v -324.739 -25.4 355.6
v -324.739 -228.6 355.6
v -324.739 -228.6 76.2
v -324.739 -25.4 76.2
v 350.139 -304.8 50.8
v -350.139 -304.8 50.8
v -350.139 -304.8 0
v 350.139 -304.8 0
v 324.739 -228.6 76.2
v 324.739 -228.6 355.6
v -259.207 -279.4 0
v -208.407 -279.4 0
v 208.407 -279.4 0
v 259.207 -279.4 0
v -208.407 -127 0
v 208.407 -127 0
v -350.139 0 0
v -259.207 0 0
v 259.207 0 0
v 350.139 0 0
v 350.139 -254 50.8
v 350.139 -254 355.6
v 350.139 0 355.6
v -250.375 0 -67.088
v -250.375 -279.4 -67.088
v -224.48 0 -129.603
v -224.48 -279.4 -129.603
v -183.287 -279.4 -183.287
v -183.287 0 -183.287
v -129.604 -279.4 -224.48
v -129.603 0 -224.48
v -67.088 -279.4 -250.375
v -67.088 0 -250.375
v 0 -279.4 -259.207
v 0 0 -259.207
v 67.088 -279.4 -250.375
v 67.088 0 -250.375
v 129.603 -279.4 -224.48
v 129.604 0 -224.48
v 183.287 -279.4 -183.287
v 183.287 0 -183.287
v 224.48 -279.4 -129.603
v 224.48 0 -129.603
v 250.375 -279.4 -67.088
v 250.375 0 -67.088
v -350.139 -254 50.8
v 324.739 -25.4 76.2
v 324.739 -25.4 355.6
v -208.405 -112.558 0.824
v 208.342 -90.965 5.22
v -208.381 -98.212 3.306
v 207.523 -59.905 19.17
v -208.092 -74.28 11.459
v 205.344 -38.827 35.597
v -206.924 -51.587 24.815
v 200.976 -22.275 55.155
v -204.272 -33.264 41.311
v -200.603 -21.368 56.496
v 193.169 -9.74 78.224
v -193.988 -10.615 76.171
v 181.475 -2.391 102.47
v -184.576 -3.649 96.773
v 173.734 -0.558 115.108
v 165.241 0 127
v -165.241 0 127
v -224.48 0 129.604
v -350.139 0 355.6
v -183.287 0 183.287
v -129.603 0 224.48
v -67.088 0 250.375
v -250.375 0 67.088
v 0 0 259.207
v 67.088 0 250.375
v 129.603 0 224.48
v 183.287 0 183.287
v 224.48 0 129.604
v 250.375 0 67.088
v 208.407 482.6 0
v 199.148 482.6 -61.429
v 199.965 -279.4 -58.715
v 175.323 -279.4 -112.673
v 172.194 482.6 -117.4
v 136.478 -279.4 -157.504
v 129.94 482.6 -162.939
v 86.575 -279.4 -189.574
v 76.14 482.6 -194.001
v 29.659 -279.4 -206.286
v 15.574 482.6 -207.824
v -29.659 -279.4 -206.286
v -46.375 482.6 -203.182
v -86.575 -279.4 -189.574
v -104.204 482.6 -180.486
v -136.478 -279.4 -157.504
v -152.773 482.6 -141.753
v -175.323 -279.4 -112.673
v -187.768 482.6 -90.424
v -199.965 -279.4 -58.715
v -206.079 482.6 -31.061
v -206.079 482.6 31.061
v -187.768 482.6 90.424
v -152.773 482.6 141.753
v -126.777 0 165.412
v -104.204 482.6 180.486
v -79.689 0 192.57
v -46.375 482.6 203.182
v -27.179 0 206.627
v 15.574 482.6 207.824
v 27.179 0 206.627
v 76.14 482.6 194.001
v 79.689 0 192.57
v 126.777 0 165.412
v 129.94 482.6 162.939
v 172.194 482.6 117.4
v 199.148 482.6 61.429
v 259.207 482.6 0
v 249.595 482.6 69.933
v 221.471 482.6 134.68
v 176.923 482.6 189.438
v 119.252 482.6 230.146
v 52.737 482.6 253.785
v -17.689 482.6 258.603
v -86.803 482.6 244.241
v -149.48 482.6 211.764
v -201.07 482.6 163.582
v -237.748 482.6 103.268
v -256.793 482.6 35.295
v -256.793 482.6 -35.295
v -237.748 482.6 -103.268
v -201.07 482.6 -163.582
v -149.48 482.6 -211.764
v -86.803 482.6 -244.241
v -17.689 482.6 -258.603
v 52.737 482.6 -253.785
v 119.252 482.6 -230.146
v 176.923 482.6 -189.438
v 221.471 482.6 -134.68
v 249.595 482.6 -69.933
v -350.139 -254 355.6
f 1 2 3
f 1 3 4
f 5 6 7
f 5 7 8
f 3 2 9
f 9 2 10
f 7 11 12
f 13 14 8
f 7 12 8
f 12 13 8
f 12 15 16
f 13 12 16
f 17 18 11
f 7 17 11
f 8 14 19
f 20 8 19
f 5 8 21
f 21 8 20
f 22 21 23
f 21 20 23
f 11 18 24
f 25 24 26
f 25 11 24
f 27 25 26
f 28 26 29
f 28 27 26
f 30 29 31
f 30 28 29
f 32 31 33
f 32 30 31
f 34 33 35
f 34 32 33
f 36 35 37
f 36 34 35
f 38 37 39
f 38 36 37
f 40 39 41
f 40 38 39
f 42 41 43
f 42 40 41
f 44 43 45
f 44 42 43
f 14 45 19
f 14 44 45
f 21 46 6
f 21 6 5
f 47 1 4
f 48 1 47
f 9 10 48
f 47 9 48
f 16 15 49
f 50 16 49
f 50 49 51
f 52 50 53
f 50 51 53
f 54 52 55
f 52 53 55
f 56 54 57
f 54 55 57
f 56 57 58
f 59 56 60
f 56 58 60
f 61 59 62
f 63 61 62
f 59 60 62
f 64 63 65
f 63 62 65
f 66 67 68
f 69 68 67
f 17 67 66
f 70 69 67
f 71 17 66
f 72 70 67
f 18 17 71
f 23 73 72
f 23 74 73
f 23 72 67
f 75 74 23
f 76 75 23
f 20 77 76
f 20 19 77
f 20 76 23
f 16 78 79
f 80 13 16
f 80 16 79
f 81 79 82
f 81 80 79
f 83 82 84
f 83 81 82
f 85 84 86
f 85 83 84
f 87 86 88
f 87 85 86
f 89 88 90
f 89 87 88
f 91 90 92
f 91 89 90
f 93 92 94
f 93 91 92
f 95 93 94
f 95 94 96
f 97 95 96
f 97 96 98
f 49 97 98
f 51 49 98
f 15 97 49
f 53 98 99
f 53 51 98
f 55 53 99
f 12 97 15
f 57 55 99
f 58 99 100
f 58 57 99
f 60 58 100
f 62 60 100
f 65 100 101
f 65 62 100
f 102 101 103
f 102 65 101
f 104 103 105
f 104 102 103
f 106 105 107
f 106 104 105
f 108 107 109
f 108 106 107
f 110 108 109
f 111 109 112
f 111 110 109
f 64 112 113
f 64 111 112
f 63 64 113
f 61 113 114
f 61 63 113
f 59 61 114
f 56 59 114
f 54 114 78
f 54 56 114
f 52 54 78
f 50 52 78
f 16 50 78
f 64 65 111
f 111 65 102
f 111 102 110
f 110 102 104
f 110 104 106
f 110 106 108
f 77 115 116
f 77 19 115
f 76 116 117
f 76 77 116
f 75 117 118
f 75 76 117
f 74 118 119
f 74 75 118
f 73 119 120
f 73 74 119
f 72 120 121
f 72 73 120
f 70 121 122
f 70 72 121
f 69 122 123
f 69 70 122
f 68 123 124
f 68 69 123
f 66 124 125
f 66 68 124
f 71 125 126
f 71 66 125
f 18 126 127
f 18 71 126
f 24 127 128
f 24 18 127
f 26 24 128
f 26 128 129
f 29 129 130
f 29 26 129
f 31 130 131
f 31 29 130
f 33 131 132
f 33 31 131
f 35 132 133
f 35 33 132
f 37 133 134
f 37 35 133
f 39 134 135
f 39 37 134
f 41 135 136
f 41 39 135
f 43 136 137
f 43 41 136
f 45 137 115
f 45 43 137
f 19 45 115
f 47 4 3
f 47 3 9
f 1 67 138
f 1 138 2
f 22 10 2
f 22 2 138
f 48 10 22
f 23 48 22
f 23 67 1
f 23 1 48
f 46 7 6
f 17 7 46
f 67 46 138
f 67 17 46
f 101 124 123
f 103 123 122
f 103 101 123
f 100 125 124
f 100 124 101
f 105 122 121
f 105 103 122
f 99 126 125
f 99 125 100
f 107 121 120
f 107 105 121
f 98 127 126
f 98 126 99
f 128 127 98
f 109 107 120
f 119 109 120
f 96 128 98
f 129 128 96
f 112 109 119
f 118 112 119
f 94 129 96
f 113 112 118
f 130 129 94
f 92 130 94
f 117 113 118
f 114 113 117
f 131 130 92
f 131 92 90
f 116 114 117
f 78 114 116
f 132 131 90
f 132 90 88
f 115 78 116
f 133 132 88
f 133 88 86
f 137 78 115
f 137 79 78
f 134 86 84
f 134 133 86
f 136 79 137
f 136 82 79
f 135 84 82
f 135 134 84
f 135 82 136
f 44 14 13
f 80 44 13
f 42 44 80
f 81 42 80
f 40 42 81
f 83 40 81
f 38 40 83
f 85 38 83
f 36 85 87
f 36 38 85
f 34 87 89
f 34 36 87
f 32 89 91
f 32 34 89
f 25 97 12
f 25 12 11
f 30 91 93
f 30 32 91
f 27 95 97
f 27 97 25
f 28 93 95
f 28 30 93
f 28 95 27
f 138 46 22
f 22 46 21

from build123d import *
from build123d.topology import SkipClean

# Parameters (mm, degrees)
SKETCH_2_R          = 259.207
SKETCH_2_R_2        = 208.407
F_19MM_DEPTH        = 482.6
F_11MM_START        = -279.4
F_11MM_DEPTH        = 279.4
SKETCH_8_W          = 700.278
SKETCH_8_H          = 254
EXTRUDE_2_DEPTH     = 355.6
SKETCH_11_W         = 649.478
SKETCH_11_H         = 203.2
CUT_EXTRUDE_1_DEPTH = 279.4
FILLET_2_R          = 127
SKETCH_13_W         = 700.278
SKETCH_13_H         = 50.8
F_2MM_DEPTH         = 50.8


with BuildPart() as part:
    # 草圖2 → 主件固定 19mm (new body)
    with BuildSketch(Plane(origin=(0, 0, 0), x_dir=(1, 0, 0), z_dir=(0, 1, 0))):
        Circle(SKETCH_2_R)
        Circle(SKETCH_2_R_2, mode=Mode.SUBTRACT)
    extrude(amount=F_19MM_DEPTH)

    # 草圖3 → 下填充 11mm (add)
    with SkipClean():  # the faces are left unmerged after this step: merging them gives an invalid solid
        with BuildSketch(Plane(origin=(0, 0, 0), x_dir=(1, 0, 0), z_dir=(0, 1, 0)).offset(F_11MM_START)):
            with BuildLine():
                ThreePointArc((208.407, 0), (0, 208.407), (-208.407, 0))
                Line((-208.407, 0), (-259.207, 0))
                ThreePointArc((-259.207, 0), (0, 259.207), (259.207, 0))
                Line((259.207, 0), (208.407, 0))
            make_face()
        extrude(amount=F_11MM_DEPTH)

    # 草圖8 → 填料-伸長2 (add)
    with SkipClean():  # the faces are left unmerged after this step: merging them gives an invalid solid
        with BuildSketch(Plane.XY):
            with Locations((0, -127)):
                Rectangle(SKETCH_8_W, SKETCH_8_H)
        extrude(amount=EXTRUDE_2_DEPTH)

    # 草圖11 → 除料-伸長1 (cut)
    with SkipClean():  # the faces are left unmerged after this step: merging them gives an invalid solid
        with BuildSketch(Plane.XY.offset(355.6)):
            with Locations((0, -127)):
                Rectangle(SKETCH_11_W, SKETCH_11_H)
        extrude(amount=-CUT_EXTRUDE_1_DEPTH, mode=Mode.SUBTRACT)

    # 圓角2
    # the kernel refuses this fillet: 127 mm, written as the material it takes off along each edge
    with BuildSketch(Plane(origin=(-525.907, 0, 0), x_dir=(0, 0, 1), z_dir=(1, 0, 0))) as fillet_2_piece_1_section:
        with BuildLine():
            CenterArc((FILLET_2_R, FILLET_2_R), FILLET_2_R, 180, 90)
            Line((0, FILLET_2_R), (0, 0))
            Line((0, 0), (FILLET_2_R, 0))
        make_face()
    fillet_2_piece_1 = extrude(amount=1051.814, mode=Mode.PRIVATE)
    fillet_2_piece_1 = fillet_2_piece_1 & Plane(origin=(0, -28.656065258, 0), x_dir=(1, 0, 0), z_dir=(0, -1, 0)) * Cylinder(208.407, 2612, mode=Mode.PRIVATE)
    add(fillet_2_piece_1, mode=Mode.SUBTRACT)

    # 草圖13 → 防水凸出2mm (add)
    with BuildSketch(Plane.XZ.offset(254)):
        with Locations((0, 25.4)):
            Rectangle(SKETCH_13_W, SKETCH_13_H)
    extrude(amount=F_2MM_DEPTH)


solid = part.part
